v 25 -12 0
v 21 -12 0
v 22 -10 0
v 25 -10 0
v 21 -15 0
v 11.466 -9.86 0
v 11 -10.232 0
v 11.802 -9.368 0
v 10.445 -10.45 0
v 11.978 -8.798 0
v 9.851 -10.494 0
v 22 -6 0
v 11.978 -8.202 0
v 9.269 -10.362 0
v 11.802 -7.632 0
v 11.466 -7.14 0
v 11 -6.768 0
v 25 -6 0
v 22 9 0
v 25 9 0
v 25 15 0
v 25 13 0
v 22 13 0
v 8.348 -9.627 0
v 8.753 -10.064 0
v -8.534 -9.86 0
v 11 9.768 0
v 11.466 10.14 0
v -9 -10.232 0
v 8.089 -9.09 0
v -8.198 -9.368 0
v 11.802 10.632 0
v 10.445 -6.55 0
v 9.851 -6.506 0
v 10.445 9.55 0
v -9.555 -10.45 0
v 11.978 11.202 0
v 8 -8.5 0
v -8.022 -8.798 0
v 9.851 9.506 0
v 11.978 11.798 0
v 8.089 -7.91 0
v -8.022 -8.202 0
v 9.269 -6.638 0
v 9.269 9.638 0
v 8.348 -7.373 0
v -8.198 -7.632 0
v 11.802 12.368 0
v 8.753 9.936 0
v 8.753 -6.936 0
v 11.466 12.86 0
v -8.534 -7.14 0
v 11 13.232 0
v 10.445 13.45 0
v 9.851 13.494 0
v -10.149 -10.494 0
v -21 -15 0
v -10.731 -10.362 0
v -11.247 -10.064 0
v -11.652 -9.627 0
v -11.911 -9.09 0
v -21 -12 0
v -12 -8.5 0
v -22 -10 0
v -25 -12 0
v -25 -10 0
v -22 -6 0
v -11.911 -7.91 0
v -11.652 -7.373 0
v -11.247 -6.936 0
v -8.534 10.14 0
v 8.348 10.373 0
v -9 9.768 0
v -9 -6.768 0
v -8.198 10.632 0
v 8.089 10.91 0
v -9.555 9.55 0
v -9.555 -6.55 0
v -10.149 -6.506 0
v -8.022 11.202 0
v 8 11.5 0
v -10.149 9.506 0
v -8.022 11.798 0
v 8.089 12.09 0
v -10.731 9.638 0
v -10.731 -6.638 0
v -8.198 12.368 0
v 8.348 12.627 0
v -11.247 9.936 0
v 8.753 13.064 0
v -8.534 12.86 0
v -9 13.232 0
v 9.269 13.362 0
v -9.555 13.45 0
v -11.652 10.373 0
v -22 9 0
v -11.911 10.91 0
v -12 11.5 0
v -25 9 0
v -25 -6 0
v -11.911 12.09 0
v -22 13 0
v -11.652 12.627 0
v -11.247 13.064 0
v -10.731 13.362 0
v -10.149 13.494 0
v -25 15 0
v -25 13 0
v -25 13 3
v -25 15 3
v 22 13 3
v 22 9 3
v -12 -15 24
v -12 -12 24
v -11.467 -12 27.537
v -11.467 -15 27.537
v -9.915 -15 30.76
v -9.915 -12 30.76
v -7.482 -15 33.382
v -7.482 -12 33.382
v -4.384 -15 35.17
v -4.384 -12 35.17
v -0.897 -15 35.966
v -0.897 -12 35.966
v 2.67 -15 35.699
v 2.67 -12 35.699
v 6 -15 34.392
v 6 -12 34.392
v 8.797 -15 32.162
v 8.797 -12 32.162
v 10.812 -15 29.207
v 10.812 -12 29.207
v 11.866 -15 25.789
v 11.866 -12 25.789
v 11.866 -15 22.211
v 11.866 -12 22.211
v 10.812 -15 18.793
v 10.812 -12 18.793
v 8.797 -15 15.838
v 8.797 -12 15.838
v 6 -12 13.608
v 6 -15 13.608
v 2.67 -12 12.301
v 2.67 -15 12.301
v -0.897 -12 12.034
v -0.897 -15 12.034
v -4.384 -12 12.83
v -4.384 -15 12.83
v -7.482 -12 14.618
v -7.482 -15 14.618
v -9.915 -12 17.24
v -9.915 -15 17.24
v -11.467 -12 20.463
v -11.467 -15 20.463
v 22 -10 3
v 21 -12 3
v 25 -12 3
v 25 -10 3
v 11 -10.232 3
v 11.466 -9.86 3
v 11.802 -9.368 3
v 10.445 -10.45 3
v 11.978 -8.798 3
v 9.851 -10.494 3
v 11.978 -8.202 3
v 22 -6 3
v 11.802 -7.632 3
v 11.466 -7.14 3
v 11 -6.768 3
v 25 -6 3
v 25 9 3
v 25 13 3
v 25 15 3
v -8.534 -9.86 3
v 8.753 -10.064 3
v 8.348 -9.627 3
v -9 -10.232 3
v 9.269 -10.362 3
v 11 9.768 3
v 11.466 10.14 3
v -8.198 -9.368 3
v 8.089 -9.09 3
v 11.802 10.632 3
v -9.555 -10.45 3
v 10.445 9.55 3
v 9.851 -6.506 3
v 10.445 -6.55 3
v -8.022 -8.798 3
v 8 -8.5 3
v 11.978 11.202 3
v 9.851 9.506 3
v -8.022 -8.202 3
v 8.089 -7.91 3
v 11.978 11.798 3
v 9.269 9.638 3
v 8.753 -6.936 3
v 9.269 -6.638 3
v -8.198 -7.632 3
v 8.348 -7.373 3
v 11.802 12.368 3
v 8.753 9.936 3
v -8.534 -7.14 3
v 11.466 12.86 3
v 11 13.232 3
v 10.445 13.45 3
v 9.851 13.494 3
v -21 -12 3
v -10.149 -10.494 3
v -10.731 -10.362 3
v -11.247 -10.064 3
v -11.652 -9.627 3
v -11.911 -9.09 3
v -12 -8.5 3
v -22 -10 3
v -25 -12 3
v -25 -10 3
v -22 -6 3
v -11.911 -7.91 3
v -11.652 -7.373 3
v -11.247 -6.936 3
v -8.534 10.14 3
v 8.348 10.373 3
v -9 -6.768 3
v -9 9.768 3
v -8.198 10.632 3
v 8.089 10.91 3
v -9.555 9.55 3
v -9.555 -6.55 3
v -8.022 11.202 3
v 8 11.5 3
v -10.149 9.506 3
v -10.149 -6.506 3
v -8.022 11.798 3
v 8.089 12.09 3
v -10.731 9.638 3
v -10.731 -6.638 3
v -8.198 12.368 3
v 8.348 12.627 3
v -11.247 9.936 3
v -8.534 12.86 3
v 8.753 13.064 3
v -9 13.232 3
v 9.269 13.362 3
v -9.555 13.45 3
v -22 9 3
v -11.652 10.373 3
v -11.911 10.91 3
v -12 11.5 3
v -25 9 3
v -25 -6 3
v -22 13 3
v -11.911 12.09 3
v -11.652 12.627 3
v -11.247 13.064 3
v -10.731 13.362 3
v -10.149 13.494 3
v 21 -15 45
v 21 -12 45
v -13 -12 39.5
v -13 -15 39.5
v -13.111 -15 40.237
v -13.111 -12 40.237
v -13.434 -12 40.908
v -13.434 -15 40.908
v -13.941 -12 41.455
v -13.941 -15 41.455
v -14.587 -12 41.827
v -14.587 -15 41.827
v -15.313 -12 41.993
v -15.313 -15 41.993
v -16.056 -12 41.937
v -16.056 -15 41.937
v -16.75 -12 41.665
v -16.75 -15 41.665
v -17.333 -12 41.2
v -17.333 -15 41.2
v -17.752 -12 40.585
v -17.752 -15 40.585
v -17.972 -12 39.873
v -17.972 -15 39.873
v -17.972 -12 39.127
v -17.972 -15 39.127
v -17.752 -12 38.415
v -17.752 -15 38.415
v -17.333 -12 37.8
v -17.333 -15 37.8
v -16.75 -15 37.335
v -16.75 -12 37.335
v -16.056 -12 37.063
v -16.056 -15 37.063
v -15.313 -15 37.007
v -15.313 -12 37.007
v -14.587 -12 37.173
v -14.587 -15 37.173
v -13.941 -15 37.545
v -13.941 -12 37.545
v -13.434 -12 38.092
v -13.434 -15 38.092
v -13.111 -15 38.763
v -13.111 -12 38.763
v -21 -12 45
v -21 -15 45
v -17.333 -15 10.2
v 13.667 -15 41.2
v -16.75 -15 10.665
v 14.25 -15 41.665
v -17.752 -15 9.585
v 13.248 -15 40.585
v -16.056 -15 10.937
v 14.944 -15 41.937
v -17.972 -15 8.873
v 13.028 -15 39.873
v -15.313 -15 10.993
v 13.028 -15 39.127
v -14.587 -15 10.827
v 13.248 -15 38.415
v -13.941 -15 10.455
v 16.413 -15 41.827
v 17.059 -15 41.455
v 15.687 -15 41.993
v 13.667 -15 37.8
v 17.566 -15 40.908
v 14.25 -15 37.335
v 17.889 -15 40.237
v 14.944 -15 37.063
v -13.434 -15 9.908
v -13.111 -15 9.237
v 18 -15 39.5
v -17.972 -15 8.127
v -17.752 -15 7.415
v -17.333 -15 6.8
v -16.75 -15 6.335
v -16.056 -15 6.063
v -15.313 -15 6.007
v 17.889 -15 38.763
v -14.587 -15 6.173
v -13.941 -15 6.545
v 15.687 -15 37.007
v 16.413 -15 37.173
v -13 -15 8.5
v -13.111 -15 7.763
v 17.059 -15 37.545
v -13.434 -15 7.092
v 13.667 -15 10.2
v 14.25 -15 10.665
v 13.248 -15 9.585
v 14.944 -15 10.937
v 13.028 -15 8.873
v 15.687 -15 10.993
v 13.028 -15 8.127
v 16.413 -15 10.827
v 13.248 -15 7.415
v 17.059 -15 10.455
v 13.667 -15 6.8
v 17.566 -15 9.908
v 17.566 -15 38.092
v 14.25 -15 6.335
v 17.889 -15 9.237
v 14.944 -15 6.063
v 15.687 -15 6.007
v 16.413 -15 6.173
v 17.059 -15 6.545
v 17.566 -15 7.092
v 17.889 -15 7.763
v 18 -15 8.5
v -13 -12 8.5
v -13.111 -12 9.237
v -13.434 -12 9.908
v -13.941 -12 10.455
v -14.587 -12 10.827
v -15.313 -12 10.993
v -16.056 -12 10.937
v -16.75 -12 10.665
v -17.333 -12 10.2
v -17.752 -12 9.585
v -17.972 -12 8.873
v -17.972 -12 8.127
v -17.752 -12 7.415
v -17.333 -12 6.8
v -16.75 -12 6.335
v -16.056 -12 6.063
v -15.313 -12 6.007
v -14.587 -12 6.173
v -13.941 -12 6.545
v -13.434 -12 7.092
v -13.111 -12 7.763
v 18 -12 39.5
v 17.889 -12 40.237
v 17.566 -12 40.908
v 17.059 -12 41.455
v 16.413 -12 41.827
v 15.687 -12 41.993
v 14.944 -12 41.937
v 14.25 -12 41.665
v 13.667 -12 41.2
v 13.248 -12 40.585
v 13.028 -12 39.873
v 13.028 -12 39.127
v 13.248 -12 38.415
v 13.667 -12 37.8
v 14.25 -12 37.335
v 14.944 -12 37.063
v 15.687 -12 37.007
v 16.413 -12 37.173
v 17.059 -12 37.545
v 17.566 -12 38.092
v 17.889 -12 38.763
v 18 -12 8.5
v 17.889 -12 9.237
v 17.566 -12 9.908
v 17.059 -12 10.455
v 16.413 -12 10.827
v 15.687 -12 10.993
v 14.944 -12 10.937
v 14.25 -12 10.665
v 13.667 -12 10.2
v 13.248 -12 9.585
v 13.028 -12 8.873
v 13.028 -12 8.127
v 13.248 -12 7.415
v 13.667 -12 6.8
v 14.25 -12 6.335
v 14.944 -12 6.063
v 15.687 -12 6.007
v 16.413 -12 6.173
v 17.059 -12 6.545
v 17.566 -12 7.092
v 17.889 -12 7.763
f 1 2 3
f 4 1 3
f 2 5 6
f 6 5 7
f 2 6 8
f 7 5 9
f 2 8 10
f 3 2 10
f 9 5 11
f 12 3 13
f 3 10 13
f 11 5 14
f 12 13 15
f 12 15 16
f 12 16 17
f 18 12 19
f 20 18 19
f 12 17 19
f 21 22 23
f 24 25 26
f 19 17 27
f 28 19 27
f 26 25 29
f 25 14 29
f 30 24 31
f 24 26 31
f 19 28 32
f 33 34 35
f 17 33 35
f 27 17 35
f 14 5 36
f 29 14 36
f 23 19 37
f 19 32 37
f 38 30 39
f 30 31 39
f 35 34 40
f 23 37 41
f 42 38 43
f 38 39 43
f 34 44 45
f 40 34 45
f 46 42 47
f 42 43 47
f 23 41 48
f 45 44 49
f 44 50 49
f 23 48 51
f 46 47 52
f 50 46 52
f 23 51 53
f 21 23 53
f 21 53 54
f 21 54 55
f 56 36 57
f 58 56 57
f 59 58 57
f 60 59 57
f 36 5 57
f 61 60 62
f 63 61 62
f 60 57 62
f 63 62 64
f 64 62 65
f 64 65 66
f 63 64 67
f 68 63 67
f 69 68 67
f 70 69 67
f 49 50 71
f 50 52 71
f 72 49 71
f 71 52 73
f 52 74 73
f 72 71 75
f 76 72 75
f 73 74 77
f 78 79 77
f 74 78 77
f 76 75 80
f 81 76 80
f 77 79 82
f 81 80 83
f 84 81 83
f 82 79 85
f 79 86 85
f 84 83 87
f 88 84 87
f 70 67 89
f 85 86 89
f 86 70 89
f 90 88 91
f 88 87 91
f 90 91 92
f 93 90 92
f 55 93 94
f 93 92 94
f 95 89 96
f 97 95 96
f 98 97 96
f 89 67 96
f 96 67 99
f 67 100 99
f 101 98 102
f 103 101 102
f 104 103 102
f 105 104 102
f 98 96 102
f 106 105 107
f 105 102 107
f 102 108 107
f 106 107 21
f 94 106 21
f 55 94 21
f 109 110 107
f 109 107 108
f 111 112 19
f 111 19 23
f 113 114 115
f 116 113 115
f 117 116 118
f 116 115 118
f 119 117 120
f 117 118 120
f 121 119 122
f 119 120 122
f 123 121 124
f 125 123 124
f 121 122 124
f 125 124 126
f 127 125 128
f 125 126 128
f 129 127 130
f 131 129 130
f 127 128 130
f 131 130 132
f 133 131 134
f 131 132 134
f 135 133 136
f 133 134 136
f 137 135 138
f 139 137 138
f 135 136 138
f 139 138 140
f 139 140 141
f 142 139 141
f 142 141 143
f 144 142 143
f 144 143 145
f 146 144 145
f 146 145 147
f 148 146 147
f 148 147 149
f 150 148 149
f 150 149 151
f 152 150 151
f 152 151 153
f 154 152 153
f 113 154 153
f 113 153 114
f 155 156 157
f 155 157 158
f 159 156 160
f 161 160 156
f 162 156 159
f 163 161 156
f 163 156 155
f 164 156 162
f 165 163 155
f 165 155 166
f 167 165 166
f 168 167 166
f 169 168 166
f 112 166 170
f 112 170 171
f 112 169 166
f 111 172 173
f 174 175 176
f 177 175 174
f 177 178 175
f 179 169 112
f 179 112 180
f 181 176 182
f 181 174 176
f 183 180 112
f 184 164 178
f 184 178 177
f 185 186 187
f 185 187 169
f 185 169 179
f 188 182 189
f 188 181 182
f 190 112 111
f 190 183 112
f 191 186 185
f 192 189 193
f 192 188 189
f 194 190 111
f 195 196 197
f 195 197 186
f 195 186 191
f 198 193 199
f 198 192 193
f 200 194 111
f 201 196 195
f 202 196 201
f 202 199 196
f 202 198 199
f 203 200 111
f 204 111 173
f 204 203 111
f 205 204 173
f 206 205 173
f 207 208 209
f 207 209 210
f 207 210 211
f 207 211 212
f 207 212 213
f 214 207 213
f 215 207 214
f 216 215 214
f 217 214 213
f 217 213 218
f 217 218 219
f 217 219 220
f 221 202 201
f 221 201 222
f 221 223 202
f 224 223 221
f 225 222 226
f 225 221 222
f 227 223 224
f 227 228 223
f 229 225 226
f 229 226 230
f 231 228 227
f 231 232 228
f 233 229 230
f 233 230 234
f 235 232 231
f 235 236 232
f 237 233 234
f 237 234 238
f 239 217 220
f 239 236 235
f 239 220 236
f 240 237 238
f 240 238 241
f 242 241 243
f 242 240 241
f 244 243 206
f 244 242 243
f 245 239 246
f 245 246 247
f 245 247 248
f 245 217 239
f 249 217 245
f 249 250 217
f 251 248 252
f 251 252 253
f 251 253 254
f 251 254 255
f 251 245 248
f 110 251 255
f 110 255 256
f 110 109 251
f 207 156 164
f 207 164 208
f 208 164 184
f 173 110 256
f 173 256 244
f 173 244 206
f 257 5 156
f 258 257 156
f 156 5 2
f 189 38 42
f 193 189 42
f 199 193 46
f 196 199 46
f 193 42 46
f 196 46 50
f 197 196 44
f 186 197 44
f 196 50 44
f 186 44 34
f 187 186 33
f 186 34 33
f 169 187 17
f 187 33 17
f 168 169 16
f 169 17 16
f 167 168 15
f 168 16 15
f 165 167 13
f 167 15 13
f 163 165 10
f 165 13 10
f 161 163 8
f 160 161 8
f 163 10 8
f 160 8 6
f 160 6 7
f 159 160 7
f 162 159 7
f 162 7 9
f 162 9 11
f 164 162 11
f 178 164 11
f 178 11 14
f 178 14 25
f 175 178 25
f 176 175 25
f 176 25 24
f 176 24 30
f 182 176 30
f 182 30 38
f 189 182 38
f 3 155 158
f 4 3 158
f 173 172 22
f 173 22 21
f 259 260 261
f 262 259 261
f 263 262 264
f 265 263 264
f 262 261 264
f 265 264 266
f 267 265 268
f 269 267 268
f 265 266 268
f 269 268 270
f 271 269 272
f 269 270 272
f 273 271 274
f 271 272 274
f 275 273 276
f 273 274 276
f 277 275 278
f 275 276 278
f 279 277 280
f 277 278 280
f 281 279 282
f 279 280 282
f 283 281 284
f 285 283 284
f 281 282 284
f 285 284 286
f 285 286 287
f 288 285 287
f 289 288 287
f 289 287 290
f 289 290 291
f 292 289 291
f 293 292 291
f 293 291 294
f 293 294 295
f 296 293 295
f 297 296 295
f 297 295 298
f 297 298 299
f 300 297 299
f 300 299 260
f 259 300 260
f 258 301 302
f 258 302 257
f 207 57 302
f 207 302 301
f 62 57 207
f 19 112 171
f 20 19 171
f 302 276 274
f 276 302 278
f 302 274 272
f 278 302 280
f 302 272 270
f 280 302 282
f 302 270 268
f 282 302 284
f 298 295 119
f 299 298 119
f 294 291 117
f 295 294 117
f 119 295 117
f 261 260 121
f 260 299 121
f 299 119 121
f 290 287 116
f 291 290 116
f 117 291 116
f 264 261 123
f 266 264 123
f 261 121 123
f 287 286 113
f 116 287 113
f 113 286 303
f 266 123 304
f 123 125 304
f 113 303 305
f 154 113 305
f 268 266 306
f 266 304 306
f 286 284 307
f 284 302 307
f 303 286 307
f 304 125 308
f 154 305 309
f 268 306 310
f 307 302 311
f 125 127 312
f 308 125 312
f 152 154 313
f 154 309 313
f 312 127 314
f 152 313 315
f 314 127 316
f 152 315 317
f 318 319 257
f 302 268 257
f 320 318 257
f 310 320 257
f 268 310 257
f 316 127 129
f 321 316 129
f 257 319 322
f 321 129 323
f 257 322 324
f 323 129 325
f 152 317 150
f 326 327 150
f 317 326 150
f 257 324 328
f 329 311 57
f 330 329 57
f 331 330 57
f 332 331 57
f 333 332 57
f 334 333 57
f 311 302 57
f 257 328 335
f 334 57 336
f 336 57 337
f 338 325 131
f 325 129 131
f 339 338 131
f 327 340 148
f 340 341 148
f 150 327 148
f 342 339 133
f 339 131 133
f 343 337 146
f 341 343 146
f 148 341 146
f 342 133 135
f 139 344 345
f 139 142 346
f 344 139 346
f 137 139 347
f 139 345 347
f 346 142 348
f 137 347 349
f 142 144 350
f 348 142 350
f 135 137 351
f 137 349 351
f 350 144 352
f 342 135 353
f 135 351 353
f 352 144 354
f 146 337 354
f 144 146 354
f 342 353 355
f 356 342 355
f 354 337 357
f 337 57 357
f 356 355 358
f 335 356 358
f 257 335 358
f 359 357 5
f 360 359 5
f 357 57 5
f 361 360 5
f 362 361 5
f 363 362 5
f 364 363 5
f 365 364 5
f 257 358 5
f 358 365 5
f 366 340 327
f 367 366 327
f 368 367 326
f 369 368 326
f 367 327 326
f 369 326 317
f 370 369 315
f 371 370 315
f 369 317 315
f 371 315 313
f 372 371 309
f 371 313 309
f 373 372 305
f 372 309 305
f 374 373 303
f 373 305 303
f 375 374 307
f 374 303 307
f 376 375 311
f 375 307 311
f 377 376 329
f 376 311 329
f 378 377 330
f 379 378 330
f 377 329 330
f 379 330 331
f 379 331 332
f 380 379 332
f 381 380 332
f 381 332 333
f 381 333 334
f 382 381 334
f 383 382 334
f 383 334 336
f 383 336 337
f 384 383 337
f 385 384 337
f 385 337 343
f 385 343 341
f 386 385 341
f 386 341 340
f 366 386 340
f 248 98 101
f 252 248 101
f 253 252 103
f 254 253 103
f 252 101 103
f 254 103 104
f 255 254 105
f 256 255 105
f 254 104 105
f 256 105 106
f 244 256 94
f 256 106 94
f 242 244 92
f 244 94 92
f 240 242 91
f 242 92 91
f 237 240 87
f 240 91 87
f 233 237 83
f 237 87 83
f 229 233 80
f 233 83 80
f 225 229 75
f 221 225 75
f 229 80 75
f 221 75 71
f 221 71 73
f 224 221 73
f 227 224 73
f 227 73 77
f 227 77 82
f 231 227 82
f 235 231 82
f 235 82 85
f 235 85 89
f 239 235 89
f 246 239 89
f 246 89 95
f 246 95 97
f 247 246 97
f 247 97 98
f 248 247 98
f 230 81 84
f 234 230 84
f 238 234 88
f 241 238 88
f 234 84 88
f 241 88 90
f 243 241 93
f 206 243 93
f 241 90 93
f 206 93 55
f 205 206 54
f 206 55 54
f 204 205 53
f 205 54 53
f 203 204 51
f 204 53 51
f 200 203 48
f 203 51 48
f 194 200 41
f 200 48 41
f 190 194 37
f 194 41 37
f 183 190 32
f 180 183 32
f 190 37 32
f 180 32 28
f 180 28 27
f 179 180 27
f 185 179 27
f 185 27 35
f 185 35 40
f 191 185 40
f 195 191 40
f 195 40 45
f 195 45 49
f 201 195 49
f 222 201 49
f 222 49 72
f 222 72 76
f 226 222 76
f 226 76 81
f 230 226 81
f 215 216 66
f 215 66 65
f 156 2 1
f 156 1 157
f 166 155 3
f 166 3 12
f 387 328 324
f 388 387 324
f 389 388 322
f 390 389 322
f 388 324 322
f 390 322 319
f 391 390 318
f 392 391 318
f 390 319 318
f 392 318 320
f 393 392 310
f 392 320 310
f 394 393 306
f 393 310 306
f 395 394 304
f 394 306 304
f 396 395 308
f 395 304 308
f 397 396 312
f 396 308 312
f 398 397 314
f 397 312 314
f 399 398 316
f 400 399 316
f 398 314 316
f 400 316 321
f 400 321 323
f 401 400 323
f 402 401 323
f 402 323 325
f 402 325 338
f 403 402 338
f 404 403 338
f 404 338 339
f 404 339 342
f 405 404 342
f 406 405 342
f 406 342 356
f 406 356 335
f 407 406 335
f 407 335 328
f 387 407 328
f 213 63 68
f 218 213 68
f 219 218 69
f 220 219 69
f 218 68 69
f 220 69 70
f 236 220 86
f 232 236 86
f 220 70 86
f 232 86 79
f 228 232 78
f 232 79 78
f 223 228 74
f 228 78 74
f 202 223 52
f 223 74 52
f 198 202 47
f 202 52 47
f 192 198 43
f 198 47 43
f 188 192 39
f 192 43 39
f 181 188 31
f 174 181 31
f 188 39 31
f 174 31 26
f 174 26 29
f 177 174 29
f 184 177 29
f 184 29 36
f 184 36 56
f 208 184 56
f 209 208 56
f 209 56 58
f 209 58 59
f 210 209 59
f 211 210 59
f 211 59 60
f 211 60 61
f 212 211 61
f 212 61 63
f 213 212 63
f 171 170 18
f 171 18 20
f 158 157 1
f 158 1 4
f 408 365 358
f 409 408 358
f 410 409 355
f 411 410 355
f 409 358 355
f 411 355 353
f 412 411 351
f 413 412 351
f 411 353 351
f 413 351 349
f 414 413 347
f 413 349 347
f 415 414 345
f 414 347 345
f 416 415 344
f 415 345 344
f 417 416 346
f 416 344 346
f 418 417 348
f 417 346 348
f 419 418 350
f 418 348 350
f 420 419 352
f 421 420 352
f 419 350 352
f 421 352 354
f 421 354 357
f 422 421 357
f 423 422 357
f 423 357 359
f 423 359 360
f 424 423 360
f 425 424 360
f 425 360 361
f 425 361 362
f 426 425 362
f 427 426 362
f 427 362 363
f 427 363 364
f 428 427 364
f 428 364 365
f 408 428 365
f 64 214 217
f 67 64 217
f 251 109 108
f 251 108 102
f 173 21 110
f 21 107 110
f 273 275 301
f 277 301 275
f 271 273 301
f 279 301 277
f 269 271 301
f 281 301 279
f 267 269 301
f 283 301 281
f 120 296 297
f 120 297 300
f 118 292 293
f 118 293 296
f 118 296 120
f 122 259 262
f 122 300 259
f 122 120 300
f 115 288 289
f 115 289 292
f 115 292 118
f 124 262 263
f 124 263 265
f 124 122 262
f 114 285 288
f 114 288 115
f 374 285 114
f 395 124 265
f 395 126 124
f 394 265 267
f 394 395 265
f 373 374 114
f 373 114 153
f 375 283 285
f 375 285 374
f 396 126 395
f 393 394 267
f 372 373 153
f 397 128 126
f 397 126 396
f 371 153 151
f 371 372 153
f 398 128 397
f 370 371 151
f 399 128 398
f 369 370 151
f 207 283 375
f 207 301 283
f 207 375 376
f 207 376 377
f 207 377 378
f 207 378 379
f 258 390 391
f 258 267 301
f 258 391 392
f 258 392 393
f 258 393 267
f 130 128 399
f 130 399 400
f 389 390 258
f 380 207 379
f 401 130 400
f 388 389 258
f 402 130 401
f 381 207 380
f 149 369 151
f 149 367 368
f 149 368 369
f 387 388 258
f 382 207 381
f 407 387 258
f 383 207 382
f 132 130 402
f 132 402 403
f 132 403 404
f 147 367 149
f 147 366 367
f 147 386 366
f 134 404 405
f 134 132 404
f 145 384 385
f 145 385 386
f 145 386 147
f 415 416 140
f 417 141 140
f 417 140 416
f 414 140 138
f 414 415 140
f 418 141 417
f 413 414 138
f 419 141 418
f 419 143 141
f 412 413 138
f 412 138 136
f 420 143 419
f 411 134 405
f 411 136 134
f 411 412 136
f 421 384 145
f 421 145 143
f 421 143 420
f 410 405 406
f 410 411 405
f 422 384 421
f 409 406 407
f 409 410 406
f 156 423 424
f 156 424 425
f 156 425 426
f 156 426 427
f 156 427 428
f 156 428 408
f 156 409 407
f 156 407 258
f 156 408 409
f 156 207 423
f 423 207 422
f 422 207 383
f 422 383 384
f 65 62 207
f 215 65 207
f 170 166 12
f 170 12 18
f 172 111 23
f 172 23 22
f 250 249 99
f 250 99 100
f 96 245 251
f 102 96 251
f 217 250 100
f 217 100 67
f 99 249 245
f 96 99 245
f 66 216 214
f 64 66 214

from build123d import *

# Parameters (mm, degrees)
F0_W      = 42
F0_H      = 27
F1_DEPTH  = 3
F0_H_2    = 3
F2_DEPTH  = 45
F4_D      = 4
F6_D      = 5
F7_R      = 12
F8_DEPTH  = 25
F9_W      = 27
F9_H      = 3
F10_DEPTH = 4
F11_W     = 3
F11_H     = 4
F12_DEPTH = 25
F13_W     = 27
F13_H     = 3
F14_DEPTH = 4
F15_W     = 3
F15_H     = 4
F16_DEPTH = 25


with BuildPart() as f1:
    # F0 (on Top) → F1 (new body)
    with BuildSketch(Plane.XY):
        with Locations((0, 1.5)):
            Rectangle(F0_W, F0_H)
    extrude(amount=F1_DEPTH)

    # F0 (on Top) → F2 (join)
    with BuildSketch(Plane.XY):
        with Locations((0, -13.5)):
            Rectangle(F0_W, F0_H_2)
    extrude(amount=F2_DEPTH)

    # F4 (through all)
    with Locations(Plane.XY.offset(3)):
        with Locations((10, -8.5), (10, 11.5), (-10, 11.5), (-10, -8.5)):
            Hole(F4_D / 2)

    # F6 (through all)
    with Locations(Plane(origin=(0, -12, 0), x_dir=(-1, 0, 0), z_dir=(0, 1, 0))):
        with Locations((-15.5, 39.5), (-15.5, 8.5), (15.5, 8.5), (15.5, 39.5)):
            Hole(F6_D / 2)

    # F7 (on face) → F8 (cut)
    with BuildSketch(Plane(origin=(0, -12, 0), x_dir=(-1, 0, 0), z_dir=(0, 1, 0))):
        with Locations((0, 24)):
            Circle(F7_R)
    extrude(amount=-F8_DEPTH, mode=Mode.SUBTRACT)

    # F9 (on face) → F10 (join)
    with BuildSketch(Plane(origin=(-21, 0, 0), x_dir=(0, -1, 0), z_dir=(-1, 0, 0))):
        with Locations((-1.5, 1.5)):
            Rectangle(F9_W, F9_H)
    extrude(amount=F10_DEPTH)

    # F11 (on face) → F12 (cut)
    with BuildSketch(Plane.XY.offset(3)):
        with Locations((-23.5, 11)):
            Rectangle(F11_W, F11_H)
        with Locations((-23.5, -8)):
            Rectangle(F11_W, F11_H)
    extrude(amount=-F12_DEPTH, mode=Mode.SUBTRACT)

    # F13 (on face) → F14 (join)
    with BuildSketch(Plane.YZ.offset(21)):
        with Locations((1.5, 1.5)):
            Rectangle(F13_W, F13_H)
    extrude(amount=F14_DEPTH)

    # F15 (on face) → F16 (cut)
    with BuildSketch(Plane.XY.offset(3)):
        with Locations((23.5, 11)):
            Rectangle(F15_W, F15_H)
        with Locations((23.5, -8)):
            Rectangle(F15_W, F15_H)
    extrude(amount=-F16_DEPTH, mode=Mode.SUBTRACT)


solid = f1.part
